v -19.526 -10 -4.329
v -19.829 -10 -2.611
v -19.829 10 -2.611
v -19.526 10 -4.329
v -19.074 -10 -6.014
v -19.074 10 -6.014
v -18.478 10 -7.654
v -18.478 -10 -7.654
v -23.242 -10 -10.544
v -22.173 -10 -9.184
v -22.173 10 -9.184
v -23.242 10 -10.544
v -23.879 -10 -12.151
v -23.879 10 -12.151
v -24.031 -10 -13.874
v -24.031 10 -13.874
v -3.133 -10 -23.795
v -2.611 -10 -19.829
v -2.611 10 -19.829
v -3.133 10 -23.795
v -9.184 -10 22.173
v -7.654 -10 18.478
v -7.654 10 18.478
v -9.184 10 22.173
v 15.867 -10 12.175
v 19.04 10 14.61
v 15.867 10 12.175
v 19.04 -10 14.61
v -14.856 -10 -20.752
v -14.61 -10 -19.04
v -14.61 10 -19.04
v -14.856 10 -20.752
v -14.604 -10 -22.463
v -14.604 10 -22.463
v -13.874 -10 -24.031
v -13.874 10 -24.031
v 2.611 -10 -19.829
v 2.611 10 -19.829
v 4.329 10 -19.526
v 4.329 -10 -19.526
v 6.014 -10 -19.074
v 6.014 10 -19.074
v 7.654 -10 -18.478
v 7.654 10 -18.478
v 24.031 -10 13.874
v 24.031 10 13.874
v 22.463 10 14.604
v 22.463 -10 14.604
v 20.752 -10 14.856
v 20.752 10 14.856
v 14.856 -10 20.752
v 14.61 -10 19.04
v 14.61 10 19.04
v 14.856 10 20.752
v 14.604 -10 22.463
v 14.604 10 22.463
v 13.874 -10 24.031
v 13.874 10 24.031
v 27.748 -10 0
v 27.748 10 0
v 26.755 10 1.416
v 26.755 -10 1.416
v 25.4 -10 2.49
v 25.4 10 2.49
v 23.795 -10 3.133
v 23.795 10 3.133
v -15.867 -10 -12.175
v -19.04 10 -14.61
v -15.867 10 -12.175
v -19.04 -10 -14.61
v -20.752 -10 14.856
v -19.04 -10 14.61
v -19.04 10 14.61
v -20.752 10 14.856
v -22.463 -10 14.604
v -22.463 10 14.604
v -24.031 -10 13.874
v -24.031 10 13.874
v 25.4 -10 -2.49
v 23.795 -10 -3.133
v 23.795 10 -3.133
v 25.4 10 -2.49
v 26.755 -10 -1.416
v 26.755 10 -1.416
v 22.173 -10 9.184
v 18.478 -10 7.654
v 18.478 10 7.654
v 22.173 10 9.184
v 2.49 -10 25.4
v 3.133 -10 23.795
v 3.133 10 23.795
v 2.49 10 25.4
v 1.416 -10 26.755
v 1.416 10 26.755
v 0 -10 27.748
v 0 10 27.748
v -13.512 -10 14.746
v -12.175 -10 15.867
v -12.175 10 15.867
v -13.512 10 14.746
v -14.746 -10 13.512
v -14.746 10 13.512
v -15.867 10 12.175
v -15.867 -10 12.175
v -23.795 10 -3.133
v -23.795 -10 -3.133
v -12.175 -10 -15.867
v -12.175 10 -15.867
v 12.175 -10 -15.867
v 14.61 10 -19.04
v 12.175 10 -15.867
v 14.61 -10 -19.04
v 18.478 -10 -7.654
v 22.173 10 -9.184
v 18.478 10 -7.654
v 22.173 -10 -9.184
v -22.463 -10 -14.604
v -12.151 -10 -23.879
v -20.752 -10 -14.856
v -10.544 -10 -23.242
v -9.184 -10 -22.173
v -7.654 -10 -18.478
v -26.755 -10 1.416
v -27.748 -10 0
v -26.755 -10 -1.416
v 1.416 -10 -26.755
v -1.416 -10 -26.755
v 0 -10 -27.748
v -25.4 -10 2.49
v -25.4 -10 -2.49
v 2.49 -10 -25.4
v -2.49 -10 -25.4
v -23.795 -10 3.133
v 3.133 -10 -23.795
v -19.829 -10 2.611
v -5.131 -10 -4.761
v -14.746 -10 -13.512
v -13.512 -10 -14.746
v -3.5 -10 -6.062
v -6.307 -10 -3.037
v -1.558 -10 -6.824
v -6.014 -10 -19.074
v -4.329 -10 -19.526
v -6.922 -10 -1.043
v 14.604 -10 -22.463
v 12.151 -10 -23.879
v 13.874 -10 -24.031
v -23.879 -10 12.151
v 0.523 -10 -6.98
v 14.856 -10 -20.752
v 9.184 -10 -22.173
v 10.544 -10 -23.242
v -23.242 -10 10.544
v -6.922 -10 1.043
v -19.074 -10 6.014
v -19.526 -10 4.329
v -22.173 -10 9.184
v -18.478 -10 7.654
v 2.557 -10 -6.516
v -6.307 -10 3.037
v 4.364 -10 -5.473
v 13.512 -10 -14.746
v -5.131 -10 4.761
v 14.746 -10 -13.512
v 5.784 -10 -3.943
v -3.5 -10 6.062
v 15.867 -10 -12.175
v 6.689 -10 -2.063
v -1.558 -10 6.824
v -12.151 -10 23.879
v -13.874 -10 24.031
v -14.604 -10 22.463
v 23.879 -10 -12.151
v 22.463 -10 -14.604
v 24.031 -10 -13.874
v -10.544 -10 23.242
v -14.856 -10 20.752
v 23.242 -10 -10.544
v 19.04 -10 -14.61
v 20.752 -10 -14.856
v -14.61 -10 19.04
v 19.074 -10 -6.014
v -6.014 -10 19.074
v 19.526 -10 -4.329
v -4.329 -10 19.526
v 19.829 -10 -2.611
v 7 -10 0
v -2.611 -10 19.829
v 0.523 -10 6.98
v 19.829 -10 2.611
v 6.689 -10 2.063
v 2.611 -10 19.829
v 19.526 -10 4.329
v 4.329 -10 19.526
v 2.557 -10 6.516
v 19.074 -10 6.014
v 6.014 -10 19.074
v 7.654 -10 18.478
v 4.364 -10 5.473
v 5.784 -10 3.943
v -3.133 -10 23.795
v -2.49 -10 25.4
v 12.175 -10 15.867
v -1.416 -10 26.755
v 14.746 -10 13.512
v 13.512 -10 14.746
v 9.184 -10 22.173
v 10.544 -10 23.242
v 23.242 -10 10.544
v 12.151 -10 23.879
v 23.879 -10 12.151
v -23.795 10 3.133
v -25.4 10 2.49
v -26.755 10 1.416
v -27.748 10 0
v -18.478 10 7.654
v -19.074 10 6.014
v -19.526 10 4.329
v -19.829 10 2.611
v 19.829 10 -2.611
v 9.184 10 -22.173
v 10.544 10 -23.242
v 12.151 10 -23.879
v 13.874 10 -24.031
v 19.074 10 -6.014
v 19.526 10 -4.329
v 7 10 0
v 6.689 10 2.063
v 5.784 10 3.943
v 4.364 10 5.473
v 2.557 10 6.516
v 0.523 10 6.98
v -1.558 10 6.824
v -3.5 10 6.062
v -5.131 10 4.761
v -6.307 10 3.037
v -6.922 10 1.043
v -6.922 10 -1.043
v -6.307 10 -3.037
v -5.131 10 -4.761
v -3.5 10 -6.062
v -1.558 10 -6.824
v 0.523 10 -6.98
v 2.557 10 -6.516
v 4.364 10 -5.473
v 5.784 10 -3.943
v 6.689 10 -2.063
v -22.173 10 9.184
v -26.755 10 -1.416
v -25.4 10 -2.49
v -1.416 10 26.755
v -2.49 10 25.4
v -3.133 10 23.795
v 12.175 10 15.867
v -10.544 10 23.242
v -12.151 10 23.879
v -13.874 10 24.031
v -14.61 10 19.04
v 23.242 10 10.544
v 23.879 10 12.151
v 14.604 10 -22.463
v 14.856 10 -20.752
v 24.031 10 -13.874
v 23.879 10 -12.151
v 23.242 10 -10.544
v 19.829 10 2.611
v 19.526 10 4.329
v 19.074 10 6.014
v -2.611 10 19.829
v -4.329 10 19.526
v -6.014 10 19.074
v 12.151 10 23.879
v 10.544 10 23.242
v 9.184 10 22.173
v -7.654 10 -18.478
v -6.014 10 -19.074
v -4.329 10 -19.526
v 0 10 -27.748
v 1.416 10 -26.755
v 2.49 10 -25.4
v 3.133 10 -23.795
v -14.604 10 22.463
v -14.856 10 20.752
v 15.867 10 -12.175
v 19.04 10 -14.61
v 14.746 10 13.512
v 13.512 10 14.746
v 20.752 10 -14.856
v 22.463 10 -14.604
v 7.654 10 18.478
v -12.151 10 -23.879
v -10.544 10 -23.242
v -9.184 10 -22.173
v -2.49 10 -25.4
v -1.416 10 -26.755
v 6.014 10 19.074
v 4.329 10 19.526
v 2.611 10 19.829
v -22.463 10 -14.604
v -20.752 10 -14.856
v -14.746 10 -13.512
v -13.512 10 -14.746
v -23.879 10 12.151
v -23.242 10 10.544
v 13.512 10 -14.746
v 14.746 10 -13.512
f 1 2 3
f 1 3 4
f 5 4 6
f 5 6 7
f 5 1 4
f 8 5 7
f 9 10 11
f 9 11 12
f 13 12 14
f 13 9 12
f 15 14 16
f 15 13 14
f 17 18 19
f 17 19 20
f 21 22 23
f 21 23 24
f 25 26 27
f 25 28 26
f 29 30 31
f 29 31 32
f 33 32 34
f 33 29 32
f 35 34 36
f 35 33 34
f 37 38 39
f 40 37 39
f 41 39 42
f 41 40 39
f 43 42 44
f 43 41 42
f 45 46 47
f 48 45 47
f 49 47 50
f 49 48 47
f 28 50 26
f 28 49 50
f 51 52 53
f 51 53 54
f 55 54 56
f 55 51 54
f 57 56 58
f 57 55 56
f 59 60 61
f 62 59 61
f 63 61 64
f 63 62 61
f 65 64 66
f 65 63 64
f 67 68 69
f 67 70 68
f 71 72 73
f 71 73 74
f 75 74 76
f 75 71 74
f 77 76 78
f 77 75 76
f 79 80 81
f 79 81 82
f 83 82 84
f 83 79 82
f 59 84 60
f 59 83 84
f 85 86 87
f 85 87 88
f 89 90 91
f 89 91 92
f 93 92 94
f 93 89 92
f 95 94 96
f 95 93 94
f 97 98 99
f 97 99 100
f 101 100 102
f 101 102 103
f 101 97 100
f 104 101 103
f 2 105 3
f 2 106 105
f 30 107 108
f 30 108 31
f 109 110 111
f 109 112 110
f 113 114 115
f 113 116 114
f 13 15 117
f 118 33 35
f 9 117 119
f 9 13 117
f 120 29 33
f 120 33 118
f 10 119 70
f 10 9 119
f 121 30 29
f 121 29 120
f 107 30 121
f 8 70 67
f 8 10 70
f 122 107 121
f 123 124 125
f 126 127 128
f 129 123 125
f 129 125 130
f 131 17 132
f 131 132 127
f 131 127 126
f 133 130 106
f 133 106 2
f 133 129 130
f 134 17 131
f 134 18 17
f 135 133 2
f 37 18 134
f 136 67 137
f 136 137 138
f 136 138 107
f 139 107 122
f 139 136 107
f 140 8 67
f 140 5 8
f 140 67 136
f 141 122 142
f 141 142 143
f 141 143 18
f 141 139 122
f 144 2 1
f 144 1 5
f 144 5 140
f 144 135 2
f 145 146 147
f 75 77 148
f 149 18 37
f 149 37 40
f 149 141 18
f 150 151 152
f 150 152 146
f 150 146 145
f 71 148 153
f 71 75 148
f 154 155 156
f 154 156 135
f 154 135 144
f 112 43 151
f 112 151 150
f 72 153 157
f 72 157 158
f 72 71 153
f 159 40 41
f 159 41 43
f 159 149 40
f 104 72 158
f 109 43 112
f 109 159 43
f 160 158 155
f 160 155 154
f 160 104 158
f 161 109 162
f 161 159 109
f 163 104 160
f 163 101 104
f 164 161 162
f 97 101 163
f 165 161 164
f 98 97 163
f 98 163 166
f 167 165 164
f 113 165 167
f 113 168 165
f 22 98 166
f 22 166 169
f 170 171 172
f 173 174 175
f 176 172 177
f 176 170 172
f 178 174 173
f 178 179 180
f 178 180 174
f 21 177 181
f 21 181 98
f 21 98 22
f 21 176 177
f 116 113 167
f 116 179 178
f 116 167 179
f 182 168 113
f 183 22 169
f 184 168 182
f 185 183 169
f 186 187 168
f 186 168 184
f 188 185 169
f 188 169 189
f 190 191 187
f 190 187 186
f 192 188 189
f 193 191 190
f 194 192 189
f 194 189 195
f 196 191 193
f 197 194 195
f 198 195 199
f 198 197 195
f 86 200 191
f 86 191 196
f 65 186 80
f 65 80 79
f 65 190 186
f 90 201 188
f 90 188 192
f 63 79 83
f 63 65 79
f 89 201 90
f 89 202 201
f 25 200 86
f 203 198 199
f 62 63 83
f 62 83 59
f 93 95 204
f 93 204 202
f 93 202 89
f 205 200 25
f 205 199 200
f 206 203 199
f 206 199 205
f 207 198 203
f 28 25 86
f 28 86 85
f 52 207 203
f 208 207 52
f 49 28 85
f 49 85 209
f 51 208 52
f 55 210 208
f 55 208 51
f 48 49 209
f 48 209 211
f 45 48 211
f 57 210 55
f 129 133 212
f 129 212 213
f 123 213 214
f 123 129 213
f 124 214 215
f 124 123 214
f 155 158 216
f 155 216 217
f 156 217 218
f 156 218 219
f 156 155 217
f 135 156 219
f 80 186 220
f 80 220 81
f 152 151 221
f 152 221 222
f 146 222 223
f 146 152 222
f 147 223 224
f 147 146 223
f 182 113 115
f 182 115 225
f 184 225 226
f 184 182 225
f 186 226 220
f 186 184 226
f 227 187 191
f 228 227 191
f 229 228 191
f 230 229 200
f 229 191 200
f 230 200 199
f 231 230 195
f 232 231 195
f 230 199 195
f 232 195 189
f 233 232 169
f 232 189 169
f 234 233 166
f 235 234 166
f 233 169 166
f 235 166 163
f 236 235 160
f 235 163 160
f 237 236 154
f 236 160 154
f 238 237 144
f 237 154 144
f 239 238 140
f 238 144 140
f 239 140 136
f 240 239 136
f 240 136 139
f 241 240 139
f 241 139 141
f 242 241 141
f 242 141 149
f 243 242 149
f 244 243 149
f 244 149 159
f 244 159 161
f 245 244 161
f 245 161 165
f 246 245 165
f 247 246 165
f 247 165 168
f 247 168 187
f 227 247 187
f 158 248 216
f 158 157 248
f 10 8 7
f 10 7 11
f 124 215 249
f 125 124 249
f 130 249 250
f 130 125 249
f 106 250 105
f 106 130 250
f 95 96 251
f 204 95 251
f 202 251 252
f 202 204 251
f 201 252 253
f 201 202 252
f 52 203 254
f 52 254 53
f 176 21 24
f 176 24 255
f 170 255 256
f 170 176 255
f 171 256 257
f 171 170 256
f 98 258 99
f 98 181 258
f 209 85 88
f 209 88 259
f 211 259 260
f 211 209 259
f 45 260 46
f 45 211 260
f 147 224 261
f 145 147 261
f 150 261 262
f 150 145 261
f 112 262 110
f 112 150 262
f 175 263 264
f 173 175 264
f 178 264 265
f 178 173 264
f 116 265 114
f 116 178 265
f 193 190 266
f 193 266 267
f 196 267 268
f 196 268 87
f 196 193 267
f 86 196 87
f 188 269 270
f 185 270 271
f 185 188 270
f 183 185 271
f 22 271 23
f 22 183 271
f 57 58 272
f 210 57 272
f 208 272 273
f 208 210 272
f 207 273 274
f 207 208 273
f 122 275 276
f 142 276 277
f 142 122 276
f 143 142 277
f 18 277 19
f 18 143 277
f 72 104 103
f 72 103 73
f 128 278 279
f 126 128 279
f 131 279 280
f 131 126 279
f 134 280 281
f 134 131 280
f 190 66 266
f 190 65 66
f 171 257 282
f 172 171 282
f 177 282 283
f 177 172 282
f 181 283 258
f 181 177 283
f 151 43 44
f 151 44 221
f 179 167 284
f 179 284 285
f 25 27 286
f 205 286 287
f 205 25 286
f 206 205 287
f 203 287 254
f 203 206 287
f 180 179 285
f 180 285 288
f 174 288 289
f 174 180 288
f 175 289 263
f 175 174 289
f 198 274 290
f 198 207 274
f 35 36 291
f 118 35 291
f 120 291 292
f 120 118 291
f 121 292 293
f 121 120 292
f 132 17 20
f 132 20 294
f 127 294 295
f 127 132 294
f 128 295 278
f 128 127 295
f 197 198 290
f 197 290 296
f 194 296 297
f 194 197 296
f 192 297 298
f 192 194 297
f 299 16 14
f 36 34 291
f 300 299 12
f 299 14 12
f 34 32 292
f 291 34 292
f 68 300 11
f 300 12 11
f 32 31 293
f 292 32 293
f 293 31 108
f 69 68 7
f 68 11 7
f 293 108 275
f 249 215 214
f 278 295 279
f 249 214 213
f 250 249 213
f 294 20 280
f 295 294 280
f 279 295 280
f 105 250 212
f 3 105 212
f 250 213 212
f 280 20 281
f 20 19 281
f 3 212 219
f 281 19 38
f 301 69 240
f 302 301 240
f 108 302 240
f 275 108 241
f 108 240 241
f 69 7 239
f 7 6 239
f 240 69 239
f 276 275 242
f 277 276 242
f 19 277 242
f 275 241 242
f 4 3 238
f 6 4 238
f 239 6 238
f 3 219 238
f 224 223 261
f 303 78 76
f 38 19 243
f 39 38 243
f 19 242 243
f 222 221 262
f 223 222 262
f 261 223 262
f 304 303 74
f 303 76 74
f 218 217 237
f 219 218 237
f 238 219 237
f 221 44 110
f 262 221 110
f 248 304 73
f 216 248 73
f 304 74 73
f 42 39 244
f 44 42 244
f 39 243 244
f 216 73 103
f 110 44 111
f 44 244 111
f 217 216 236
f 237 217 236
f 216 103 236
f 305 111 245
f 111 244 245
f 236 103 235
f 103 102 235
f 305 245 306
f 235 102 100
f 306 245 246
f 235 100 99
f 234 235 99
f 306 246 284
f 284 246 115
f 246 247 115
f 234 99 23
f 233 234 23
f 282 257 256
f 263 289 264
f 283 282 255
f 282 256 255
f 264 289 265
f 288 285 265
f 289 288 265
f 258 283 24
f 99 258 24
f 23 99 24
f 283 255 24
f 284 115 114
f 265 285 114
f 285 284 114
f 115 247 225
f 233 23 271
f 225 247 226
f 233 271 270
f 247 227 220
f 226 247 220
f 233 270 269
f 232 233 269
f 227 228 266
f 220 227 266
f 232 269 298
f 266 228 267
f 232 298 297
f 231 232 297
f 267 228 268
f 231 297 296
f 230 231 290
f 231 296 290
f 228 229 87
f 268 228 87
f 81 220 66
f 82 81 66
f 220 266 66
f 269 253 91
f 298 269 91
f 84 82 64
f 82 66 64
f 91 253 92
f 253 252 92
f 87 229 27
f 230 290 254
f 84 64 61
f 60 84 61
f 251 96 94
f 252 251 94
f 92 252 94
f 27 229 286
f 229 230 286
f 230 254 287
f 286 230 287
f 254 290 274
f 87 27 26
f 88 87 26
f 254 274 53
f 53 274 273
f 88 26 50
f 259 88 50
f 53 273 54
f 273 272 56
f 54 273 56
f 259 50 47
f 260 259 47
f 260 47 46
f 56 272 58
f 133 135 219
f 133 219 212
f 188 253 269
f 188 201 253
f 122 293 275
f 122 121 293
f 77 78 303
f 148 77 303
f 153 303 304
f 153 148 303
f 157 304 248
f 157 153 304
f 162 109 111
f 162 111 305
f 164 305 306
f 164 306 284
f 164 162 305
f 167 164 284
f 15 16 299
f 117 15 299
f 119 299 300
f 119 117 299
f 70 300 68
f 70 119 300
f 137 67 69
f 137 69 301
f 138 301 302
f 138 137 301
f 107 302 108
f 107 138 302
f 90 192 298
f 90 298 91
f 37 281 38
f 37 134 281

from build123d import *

# Parameters (mm, degrees)
F2_DEPTH        = 10
F2_COPIES_COUNT = 12
F4_R            = 7
F5_DEPTH        = 20.001


# Not quite as in the source:
# - a feature of the source that left no trace in its solid (it failed there, or was rolled back) is left out
# - a pattern or mirror of a feature is missing from the dataset's text; its kind, count and spacing are read off the source's solid


with BuildPart() as f2:
    # F1 (on Front) → F2 (new body, symmetric)
    with BuildSketch(Plane.XZ):
        with BuildLine():
            ThreePointArc((-2.6105238444, 19.8288972275), (-13.186916302, -15.0367961496), (20, 0))
            ThreePointArc((20, 0), (15.0367961496, 13.186916302), (2.6105238444, 19.8288972275))
            ThreePointArc((2.6105238444, 19.8288972275), (0, 20), (-2.6105238444, 19.8288972275))
        make_face()
        with BuildLine():
            ThreePointArc((-2.6105238444, 19.8288972275), (0, 20), (2.6105238444, 19.8288972275))
            Line((2.6105238444, 19.8288972275), (3.1326286133, 23.794676673))
            ThreePointArc((3.1326286133, 23.794676673), (2.0019466325, 26.1165955987), (0, 27.7481466766))
            ThreePointArc((0, 27.7481466766), (-2.0019466325, 26.1165955987), (-3.1326286133, 23.794676673))
            Line((-3.1326286133, 23.794676673), (-2.6105238444, 19.8288972275))
        make_face()
    extrude(amount=F2_DEPTH, both=True)

    # F2_copies: F2 ×12 about axis
    f2_copies_axis = Axis((0, 0, 0), (0, 1, 0))


with BuildPart() as f2_1:
    add(f2.part)
    for i in range(1, F2_COPIES_COUNT):
        add(f2.part.rotate(f2_copies_axis, i * 360 / F2_COPIES_COUNT))

    # F4 (on face) → F5 (cut, through all)
    with BuildSketch(Plane.XZ.offset(10)):
        Circle(F4_R)
    extrude(amount=-F5_DEPTH, mode=Mode.SUBTRACT)


solid = f2_1.part
